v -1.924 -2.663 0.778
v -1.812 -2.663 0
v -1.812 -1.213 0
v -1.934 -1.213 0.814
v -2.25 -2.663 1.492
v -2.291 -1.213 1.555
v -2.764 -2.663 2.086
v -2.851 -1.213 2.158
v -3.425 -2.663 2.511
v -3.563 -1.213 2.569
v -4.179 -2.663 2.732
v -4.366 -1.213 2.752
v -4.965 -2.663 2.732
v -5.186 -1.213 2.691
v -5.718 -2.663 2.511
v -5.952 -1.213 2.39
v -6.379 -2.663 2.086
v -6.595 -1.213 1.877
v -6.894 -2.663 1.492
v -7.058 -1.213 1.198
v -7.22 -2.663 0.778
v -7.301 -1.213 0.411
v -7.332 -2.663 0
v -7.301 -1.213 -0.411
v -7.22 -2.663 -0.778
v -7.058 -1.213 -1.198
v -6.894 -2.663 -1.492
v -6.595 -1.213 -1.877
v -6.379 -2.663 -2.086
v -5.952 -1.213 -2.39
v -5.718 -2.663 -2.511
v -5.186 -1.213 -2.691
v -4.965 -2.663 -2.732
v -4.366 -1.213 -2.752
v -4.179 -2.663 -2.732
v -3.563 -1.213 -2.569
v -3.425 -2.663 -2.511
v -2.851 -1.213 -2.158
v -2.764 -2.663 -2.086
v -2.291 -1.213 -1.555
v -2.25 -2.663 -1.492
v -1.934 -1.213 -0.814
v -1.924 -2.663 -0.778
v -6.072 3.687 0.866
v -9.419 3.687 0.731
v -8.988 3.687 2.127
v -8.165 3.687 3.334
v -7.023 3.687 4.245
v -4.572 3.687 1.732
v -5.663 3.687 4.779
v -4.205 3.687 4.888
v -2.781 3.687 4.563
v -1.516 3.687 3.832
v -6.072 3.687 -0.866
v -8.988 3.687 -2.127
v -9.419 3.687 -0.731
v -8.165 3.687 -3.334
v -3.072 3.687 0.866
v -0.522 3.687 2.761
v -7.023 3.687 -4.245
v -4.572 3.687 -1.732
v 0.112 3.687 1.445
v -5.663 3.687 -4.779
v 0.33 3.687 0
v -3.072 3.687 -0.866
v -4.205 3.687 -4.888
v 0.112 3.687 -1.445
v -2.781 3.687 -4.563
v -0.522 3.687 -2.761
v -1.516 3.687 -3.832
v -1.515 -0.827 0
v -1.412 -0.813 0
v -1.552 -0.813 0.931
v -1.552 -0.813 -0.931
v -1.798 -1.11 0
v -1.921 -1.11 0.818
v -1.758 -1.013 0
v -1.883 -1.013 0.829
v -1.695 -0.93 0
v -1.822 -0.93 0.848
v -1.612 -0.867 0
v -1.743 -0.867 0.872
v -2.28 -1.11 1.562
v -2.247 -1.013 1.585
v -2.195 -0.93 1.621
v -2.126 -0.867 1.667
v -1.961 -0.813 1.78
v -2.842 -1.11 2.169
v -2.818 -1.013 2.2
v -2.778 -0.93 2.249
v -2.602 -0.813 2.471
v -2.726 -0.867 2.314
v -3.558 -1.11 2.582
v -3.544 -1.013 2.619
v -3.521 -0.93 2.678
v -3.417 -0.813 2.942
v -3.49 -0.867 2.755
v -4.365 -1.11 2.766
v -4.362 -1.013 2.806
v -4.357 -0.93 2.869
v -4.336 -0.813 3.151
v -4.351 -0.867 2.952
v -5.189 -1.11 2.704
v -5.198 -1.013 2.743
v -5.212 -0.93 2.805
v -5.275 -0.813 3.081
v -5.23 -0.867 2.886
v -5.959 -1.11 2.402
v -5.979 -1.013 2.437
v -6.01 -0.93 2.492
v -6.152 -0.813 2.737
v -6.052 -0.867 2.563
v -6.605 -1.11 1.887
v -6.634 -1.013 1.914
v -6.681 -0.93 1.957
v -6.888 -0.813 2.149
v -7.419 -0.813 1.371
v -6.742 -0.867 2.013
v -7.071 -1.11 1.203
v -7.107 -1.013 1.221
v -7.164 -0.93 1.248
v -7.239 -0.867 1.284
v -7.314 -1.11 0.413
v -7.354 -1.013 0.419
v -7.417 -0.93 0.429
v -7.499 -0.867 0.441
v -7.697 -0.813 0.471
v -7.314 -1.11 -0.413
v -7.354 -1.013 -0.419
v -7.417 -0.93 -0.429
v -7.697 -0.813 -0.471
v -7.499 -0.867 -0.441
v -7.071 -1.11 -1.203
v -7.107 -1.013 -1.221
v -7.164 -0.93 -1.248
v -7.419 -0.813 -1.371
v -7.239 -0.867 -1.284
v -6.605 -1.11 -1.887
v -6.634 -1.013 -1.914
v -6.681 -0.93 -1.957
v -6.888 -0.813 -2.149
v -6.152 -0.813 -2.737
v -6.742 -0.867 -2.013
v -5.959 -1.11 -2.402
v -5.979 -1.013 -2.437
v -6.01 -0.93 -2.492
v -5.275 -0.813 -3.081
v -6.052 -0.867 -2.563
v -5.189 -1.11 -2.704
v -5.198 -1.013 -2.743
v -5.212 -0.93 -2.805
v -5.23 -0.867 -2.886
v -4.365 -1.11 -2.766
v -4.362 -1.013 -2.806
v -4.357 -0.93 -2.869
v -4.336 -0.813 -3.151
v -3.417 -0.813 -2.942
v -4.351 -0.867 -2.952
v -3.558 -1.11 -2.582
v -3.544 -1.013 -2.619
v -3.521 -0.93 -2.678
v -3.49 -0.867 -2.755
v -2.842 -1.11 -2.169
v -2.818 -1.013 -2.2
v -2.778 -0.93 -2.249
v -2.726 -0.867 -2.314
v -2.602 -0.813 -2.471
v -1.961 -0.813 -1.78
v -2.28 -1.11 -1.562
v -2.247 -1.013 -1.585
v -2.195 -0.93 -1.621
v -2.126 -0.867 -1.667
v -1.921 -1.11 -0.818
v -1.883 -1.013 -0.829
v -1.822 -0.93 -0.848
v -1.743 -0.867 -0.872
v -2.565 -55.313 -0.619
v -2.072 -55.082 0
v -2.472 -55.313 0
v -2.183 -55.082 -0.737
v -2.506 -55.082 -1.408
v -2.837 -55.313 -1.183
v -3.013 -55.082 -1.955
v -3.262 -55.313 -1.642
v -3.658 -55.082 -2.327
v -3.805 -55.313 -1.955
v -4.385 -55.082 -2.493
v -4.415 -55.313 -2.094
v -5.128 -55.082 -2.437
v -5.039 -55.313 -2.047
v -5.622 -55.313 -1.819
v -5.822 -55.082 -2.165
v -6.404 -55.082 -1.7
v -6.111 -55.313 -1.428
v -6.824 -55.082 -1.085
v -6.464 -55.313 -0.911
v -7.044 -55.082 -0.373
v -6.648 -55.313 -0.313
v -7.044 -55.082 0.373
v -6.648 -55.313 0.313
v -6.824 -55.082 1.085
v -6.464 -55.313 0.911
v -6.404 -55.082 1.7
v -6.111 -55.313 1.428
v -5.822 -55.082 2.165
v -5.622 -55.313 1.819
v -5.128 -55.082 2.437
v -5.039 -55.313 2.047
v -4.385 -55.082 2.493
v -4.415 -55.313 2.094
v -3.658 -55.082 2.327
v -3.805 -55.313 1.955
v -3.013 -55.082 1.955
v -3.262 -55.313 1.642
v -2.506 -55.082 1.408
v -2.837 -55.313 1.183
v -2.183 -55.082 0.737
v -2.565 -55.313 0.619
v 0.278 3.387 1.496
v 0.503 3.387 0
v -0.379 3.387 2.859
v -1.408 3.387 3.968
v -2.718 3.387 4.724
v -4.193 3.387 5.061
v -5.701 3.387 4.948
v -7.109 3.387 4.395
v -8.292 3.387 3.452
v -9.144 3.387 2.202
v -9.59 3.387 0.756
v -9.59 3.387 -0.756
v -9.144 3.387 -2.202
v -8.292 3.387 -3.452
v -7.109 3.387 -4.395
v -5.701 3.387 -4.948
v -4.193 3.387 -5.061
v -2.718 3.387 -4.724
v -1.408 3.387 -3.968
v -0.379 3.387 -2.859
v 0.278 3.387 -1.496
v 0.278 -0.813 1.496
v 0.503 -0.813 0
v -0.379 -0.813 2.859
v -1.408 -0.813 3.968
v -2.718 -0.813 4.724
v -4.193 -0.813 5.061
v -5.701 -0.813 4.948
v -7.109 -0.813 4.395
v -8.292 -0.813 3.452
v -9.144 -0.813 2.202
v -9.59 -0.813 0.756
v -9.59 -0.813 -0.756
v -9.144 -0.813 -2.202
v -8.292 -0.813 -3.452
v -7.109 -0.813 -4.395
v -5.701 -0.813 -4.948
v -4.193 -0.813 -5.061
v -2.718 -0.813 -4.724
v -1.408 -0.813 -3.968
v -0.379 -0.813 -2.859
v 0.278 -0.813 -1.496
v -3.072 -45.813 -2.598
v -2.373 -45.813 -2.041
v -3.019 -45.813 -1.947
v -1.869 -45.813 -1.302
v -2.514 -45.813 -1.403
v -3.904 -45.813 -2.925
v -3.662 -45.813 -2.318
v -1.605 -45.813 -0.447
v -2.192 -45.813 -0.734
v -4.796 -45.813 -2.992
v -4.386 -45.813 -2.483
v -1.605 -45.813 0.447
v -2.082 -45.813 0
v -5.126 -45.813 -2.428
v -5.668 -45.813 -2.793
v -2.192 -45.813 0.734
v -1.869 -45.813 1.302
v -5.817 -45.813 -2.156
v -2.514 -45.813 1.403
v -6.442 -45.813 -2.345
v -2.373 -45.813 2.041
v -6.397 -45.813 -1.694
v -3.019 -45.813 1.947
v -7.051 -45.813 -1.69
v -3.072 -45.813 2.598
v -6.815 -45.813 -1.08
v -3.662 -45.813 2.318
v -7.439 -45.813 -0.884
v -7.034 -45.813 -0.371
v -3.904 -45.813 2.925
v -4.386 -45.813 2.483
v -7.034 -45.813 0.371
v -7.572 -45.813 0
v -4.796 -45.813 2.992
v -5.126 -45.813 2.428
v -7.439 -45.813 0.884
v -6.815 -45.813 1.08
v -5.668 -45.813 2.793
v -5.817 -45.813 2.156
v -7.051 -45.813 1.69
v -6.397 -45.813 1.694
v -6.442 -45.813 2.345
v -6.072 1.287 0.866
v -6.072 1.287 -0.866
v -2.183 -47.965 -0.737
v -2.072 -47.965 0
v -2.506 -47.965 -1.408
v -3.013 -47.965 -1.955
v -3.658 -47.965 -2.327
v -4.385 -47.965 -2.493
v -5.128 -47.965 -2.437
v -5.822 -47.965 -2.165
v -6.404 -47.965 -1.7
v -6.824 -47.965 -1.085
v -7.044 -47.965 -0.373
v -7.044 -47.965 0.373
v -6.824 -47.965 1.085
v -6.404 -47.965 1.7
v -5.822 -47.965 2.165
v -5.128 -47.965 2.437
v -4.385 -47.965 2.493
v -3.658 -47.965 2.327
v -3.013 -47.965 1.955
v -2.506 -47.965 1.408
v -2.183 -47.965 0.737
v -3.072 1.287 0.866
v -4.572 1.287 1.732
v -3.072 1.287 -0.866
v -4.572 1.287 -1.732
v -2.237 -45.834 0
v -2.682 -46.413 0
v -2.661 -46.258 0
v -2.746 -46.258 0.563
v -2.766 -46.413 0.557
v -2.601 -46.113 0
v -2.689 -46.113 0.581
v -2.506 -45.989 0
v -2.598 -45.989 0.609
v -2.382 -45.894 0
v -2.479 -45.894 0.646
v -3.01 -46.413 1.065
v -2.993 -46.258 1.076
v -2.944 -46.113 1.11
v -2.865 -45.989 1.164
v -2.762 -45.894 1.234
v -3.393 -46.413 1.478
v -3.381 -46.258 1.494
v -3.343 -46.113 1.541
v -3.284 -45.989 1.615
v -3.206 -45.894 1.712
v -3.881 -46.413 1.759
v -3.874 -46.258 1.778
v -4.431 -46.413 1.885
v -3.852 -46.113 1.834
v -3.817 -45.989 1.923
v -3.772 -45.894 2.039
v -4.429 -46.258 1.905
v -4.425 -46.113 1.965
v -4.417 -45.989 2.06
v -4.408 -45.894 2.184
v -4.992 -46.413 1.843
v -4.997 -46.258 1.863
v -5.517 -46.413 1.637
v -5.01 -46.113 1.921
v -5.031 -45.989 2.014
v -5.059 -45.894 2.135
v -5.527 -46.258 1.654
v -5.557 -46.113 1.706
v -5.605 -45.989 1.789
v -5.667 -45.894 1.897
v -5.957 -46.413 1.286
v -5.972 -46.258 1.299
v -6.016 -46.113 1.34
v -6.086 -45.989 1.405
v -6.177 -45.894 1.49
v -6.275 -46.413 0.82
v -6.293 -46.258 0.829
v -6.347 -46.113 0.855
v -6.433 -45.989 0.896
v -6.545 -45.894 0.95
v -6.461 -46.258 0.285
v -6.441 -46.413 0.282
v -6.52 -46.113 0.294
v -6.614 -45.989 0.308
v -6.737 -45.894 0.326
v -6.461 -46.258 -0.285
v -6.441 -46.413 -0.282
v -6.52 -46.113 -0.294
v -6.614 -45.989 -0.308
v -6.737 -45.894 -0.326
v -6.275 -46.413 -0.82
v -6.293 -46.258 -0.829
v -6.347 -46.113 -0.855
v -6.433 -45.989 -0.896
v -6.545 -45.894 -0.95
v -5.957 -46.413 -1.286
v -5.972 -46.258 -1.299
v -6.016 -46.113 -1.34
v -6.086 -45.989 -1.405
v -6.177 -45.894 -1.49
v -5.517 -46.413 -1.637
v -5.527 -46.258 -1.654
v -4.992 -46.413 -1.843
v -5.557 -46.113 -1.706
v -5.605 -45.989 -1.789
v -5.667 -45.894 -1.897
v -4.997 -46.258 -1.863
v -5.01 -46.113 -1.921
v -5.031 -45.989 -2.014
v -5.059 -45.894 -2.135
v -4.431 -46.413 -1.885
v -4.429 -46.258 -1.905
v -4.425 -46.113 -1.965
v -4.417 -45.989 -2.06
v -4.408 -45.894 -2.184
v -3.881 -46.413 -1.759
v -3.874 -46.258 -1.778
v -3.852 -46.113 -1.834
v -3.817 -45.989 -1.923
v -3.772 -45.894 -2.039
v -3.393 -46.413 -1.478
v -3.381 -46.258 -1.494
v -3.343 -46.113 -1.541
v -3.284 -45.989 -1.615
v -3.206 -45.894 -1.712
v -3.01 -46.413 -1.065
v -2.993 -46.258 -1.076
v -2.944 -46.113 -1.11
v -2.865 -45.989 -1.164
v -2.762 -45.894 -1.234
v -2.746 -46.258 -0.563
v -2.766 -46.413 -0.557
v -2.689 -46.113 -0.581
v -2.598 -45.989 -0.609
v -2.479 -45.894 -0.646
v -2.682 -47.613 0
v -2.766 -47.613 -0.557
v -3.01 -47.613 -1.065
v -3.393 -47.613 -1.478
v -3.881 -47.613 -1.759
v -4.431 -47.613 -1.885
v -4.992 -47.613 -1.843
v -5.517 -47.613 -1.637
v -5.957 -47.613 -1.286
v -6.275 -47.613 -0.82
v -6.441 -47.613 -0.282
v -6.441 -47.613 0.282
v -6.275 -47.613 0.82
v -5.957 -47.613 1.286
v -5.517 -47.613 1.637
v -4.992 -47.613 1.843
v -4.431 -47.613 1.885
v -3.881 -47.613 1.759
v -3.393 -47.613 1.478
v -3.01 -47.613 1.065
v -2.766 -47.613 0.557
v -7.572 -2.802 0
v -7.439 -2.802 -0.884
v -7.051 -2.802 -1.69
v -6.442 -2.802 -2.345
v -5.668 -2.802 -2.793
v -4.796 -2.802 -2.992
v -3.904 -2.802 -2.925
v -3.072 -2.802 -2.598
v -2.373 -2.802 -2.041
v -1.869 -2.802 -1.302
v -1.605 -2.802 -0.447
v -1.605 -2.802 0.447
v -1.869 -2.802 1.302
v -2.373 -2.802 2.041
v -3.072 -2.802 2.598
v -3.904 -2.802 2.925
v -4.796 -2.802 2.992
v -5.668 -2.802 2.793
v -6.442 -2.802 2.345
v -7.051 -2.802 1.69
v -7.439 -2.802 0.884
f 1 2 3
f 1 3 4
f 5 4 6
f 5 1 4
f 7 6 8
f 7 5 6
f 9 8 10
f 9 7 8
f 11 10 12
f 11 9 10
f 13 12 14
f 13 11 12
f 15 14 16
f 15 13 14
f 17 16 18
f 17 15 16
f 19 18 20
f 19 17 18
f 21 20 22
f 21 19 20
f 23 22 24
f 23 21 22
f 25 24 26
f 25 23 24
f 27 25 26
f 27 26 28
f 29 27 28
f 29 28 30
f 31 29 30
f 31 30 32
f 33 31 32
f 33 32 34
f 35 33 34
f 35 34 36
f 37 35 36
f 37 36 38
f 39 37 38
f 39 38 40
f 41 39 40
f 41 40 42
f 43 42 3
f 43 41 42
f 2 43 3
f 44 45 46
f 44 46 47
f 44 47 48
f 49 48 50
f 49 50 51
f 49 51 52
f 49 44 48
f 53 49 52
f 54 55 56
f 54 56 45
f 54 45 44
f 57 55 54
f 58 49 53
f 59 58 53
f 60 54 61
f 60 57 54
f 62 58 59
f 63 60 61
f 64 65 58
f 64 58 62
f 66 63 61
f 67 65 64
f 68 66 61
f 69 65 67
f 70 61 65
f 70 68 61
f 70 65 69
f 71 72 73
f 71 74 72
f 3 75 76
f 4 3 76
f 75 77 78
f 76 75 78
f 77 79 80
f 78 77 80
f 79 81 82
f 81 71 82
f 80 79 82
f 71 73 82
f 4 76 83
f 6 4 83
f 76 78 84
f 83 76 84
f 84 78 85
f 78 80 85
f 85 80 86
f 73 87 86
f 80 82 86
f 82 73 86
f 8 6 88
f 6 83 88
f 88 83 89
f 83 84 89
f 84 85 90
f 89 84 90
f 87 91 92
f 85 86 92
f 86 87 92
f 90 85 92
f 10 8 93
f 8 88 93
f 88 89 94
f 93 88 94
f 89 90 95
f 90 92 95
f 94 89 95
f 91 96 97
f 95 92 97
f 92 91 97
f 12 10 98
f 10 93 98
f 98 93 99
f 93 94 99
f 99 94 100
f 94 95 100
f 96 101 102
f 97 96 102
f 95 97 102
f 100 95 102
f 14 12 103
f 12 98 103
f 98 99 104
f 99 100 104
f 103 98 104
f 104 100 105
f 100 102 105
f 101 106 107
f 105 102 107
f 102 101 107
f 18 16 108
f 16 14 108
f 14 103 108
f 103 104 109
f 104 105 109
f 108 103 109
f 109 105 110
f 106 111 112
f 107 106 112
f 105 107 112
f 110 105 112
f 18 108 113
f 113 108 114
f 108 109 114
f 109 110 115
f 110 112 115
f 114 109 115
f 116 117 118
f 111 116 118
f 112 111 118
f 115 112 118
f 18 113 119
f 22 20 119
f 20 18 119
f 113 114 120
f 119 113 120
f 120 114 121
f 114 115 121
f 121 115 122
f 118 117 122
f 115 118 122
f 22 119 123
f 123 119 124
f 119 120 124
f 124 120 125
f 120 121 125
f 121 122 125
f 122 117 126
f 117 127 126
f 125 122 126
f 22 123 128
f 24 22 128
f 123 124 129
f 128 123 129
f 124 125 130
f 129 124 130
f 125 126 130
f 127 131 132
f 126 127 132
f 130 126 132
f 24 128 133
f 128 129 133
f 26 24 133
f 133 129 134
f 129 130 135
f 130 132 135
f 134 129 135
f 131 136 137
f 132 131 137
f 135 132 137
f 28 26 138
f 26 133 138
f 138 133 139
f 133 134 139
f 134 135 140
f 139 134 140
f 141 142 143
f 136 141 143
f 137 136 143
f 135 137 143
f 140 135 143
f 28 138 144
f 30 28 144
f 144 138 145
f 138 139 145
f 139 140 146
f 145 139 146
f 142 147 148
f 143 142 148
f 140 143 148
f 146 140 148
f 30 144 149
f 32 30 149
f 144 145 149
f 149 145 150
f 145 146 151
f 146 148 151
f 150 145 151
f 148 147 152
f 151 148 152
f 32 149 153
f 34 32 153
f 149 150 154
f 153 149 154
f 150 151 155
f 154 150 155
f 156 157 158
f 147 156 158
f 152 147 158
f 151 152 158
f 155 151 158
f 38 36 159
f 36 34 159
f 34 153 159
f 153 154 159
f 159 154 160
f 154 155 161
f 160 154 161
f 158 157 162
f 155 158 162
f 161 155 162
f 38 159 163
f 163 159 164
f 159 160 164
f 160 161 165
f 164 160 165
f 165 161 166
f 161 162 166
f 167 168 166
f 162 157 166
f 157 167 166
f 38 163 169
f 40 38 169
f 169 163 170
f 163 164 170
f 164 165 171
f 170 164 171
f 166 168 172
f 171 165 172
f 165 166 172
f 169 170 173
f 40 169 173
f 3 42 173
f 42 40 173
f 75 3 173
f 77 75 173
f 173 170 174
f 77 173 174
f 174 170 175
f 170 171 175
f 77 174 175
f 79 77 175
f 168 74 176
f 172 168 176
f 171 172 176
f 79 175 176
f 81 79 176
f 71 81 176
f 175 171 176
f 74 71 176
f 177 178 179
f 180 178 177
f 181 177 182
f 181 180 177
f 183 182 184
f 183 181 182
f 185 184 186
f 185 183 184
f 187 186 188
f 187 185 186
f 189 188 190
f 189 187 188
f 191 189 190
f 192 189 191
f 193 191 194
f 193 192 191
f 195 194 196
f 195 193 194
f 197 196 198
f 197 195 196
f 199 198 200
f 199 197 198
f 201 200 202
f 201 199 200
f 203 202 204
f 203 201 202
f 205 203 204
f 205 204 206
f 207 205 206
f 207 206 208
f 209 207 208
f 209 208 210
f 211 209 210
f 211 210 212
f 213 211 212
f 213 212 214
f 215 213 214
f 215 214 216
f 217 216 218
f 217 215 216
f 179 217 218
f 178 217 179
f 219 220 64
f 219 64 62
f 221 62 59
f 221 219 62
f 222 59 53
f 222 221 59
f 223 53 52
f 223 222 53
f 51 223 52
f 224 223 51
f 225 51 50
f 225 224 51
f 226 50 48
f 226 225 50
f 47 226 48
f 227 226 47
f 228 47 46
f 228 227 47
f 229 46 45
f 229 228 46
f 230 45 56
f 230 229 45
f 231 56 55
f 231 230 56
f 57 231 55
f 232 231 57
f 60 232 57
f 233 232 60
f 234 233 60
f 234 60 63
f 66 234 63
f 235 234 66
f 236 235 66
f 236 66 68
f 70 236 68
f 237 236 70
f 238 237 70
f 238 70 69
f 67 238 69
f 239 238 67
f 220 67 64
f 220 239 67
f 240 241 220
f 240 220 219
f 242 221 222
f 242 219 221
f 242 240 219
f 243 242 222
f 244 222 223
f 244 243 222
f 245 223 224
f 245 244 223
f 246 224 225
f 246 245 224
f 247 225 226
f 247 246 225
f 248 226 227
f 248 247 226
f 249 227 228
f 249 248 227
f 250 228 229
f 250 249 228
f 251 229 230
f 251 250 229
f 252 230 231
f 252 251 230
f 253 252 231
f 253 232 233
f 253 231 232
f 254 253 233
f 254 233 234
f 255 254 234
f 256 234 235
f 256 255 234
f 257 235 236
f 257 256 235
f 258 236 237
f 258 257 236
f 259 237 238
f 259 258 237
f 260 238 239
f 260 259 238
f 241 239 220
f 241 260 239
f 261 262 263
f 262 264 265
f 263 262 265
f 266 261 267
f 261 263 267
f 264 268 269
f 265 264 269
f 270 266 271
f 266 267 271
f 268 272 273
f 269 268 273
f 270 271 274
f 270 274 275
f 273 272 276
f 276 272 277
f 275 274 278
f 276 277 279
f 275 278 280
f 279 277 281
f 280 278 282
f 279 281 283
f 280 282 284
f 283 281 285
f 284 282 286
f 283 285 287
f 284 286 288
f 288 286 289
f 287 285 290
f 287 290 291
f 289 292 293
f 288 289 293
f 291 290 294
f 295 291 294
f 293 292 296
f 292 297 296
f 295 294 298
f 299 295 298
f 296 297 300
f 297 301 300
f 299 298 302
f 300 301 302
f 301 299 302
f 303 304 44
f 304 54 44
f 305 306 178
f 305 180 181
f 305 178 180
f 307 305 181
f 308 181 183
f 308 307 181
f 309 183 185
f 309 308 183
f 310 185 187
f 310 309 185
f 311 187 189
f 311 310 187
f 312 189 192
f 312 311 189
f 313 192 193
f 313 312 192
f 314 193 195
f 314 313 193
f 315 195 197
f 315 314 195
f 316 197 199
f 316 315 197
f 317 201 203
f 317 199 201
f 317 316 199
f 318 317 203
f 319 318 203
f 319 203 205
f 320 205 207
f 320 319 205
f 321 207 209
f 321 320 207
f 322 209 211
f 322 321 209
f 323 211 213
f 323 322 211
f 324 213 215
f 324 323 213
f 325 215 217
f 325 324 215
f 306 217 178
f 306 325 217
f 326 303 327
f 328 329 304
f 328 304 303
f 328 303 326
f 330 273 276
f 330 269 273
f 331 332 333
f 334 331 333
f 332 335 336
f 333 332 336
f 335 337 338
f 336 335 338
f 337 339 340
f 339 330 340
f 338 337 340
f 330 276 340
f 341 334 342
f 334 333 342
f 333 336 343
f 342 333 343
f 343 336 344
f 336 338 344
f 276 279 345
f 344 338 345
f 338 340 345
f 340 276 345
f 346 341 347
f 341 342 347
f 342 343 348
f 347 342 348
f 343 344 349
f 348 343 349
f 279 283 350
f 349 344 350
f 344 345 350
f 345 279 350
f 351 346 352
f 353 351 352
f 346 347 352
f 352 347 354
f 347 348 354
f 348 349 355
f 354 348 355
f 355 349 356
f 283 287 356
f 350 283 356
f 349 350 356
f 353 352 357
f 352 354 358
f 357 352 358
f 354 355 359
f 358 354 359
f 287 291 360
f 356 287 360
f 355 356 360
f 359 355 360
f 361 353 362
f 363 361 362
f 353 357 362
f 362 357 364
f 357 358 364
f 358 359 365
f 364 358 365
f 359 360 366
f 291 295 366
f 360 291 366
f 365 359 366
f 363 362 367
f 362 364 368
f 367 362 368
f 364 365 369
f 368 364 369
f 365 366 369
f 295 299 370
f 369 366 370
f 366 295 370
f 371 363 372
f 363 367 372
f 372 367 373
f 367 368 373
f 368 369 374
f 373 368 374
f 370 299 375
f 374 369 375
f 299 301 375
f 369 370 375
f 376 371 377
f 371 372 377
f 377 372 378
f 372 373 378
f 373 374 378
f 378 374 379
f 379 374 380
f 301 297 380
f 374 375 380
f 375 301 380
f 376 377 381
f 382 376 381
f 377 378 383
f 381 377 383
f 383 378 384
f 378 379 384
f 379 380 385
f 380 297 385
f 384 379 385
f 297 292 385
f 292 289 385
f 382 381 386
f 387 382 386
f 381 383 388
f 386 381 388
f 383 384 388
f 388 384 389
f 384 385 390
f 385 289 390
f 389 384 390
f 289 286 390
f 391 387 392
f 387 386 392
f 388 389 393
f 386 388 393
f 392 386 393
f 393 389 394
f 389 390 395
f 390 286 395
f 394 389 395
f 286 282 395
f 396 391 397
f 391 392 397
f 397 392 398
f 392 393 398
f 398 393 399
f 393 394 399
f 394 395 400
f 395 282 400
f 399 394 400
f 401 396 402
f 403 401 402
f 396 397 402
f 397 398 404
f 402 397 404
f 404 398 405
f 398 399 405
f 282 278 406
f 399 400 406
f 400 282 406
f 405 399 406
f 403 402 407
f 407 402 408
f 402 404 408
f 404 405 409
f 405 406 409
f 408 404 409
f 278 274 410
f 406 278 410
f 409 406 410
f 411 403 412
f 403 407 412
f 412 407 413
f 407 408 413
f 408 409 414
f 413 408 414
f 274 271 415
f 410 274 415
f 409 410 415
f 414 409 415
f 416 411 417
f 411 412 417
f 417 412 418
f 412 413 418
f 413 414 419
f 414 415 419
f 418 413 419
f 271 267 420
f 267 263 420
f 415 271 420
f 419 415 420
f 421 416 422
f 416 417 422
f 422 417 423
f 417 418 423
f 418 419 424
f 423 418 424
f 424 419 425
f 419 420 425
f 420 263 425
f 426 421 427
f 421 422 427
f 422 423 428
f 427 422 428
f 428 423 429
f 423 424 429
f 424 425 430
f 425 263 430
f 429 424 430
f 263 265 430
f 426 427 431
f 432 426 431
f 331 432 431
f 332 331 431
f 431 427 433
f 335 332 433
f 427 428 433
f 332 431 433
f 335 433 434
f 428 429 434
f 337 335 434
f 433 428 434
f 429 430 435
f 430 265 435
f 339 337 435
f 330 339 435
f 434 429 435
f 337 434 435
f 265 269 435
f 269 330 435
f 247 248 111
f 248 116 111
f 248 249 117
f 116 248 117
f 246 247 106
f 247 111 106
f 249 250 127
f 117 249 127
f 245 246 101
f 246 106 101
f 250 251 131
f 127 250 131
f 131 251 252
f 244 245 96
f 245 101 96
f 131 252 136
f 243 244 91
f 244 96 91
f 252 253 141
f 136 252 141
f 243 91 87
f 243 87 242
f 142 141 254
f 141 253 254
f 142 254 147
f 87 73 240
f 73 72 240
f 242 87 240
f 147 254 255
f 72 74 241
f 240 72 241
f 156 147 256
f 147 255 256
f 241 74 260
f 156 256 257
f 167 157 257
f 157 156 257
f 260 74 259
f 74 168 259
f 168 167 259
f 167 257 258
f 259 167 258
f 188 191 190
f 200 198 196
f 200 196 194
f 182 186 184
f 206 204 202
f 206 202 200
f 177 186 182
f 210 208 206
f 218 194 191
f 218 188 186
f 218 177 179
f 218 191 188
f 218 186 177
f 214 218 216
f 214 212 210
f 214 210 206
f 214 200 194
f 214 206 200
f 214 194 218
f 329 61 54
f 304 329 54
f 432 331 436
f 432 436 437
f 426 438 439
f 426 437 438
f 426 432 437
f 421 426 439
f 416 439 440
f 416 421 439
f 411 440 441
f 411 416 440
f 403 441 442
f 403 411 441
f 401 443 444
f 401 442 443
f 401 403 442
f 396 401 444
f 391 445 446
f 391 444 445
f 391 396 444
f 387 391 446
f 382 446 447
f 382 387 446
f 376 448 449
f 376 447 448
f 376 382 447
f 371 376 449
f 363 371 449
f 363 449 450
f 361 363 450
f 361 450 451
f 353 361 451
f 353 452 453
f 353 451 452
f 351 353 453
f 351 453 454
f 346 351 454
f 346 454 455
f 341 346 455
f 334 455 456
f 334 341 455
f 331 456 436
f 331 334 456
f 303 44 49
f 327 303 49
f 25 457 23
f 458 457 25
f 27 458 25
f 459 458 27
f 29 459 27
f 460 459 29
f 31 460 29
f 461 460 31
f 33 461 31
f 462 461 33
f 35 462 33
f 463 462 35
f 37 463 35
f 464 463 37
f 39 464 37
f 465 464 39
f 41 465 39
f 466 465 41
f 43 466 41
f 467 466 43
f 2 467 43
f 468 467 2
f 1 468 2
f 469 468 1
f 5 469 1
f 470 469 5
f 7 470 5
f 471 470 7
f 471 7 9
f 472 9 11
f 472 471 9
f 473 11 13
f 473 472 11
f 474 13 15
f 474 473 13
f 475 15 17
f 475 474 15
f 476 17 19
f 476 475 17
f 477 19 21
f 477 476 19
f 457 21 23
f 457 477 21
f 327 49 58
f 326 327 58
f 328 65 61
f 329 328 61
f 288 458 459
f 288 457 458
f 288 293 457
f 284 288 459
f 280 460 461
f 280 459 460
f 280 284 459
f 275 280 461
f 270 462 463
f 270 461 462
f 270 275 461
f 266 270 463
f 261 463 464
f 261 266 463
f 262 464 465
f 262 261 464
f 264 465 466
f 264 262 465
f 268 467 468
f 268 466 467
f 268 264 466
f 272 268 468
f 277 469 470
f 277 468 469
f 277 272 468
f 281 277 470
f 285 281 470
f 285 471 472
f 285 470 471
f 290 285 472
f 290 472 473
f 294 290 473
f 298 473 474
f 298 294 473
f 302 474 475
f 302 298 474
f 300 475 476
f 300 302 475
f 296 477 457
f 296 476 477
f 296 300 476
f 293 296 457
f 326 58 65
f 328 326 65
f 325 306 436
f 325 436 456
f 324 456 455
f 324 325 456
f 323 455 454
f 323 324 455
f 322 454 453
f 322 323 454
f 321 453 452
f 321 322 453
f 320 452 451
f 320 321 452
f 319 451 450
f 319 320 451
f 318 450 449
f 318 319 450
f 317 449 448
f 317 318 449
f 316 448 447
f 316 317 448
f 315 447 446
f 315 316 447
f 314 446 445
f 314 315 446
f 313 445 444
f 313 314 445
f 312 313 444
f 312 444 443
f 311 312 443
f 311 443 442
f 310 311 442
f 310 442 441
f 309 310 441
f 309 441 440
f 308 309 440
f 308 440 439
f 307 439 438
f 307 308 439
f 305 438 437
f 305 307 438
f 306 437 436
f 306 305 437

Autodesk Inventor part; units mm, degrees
ref_plane "YZ Plane" through (0, 0, 0) normal (1, 0, 0) x (0, 1, 0)
ref_plane "XZ Plane" through (0, 0, 0) normal (0, 1, 0) x (-1, 0, 0)
ref_plane "XY Plane" through (0, 0, 0) normal (0, 0, 1) x (1, 0, 0)
sketch "Sketch1" plane through (0, 0, 0) normal (0, 0, 1) x (1, 0, 0)
  line L0 (-4.5718, -2.6632) -> (-7.5718, -2.6632)
  line L1 (-7.5718, -2.6632) -> (-7.5718, -45.8132)
  line L2 (-7.5718, -45.8132) -> (-4.5718, -45.8132)
  line L3 (-4.5718, -45.8132) -> (-4.5718, -2.6632)
  dimension "d1" = 43.15
  dimension "d2" = 3
revolve "Shoulder" add sketch "Sketch1" angle 360 about axis through (-4.5718, -45.8132, 0) along (0, 1, 0)
sketch "Sketch2" plane through (-4.5718, -2.6632, 0) normal (0, 1, 0) x (1, 0, 0)
  circle A0 centre (0, 0) radius 3 projected
  circle A1 centre (0, 0) radius 2.76
  dimension "d3" = 5.52
extrude "Shoulder_neck" add sketch "Sketch2" along normal blind 1.85 contours A1
sketch "Sketch3" plane through (-4.5718, -0.8132, 0) normal (0, 1, 0) x (1, 0, 0)
  circle A0 centre (0, 0) radius 2.76 projected
  circle A1 centre (0, 0) radius 5.075
  dimension "d6" = 10.15
extrude "Head" add sketch "Sketch3" along normal blind 4.5 contours A0 | A1
sketch "Sketch4" plane through (-4.5718, -45.8132, 0) normal (0, -1, 0) x (1, 0, 0)
  circle A0 centre (0, 0) radius 3 projected
  circle A1 centre (0, 0) radius 1.89
  dimension "d9" = 3.78
extrude "Thread_neck" add sketch "Sketch4" along normal blind 1.8 contours A1
sketch "Sketch5" plane through (-4.5718, -47.6132, 0) normal (0, -1, 0) x (1, 0, 0)
  circle A0 centre (0, 0) radius 1.89 projected
  circle A1 centre (0, 0) radius 2.5
  dimension "d12" = 5
extrude "Thread_shoulder" add sketch "Sketch5" along normal blind 7.7 contours A0 | A1
sketch "Sketch6" plane through (-4.5718, 3.6868, 0) normal (0, 1, 0) x (1, 0, 0)
  circle A0 centre (0, 0) radius 5.075 projected
  circle A1 centre (0, 0) radius 1.5 construction
  line L0 (-1.5, 0.866) -> (-1.5, -0.866)
  line L1 (-1.5, -0.866) -> (0, -1.7321)
  line L2 (0, -1.7321) -> (1.5, -0.866)
  line L3 (1.5, -0.866) -> (1.5, 0.866)
  line L4 (1.5, 0.866) -> (0, 1.7321)
  line L5 (0, 1.7321) -> (-1.5, 0.866)
  dimension "d15" = 3
extrude "Hex" cut sketch "Sketch6" against normal blind 2.4 contours L5 L4 L3 L2 L1 L0
chamfer "Chamfer1" distance 0.24 angle 30 1 edges at (-1.5718, -2.6632, 0) measured on face at (-7.436, -2.6632, -0.4595)
fillet "Fillet1" radius 0.4 1 edges at (-7.3318, -0.8132, 0)
chamfer "Chamfer2" distance 0.3 angle 30 1 edges at (-9.6468, 3.6868, 0) measured on face at (0.4867, 2.1868, 0.4084)
chamfer "Chamfer3" distance 0.4 angle 30 1 edges at (-7.0718, -55.3132, 0) measured on face at (-3.3106, -55.3132, -0.6619)
fillet "Fillet2" radius 0.6 1 edges at (-6.4618, -45.8132, 0)
chamfer "Chamfer7" distance 0.61 angle 30 1 edges at (-7.0718, -47.6132, 0) measured on face at (-2.3177, -47.6132, -0.3502)
thread "Thread" size "M5x0.8" class "6g" standard "ANSI Metric M Profile" full length
equation "\"d1\" = Shoulder_length - Shoulder_neck_length"
equation "\"d2\" = 0.5 * Shoulder_diameter"
equation "\"d3\" = Shoulder_neck_dia"
equation "\"d4\" = Shoulder_neck_length"
equation "\"d6\" = Head_diameter"
equation "\"d7\" = Head_height"
equation "\"d9\" = Thread_neck_dia"
equation "\"d10\" = Thread_neck_length"
equation "\"d12\" = Thread_diameter"
equation "\"d13\" = Thread_length - Thread_neck_length"
equation "\"d15\" = Hex_size"
equation "\"d16\" = Hex_length"
equation "\"d18\" = -0.5 * Shoulder_neck_dia + 0.5 * Shoulder_diameter"
equation "\"d64\" = -0.5 * Shoulder_neck_dia + 0.5 * Shoulder_diameter"
equation "\"d21\" = 0.1 * Hex_size"
equation "\"d65\" = 0.1 * Hex_size"
equation "\"d23\" = 0.5 * Thread_pitch"
equation "\"d66\" = 0.5 * Thread_pitch"
equation "\"d25\" = Thread_neck_radius"
equation "\"d60\" = -0.5 * Thread_neck_dia + 0.5 * Thread_diameter"
equation "\"d67\" = -0.5 * Thread_neck_dia + 0.5 * Thread_diameter"
equation "\"Shoulder_diameter\" = 6"
equation "\"Shoulder_length\" = 45"
equation "\"Shoulder_neck_dia\" = 5.52"
equation "\"Thread_diameter\" = 5"
equation "\"Thread_length\" = 9.5"
equation "\"Head_diameter\" = 10.15"
equation "\"Head_height\" = 4.5"
equation "\"Thread_neck_dia\" = 3.78"
equation "\"Hex_size\" = 3"
equation "\"Hex_length\" = 2.4"
equation "\"Thread_pitch\" = 0.8"
equation "\"Shoulder_neck_length\" = 1.85"
equation "\"Thread_neck_length\" = 1.8"
equation "\"Thread_neck_radius\" = 0.6"
properties part number "SCREW, SHOULDER, P, 12.9,  M6X45MM" material "Steel, High Strength Low Alloy"
